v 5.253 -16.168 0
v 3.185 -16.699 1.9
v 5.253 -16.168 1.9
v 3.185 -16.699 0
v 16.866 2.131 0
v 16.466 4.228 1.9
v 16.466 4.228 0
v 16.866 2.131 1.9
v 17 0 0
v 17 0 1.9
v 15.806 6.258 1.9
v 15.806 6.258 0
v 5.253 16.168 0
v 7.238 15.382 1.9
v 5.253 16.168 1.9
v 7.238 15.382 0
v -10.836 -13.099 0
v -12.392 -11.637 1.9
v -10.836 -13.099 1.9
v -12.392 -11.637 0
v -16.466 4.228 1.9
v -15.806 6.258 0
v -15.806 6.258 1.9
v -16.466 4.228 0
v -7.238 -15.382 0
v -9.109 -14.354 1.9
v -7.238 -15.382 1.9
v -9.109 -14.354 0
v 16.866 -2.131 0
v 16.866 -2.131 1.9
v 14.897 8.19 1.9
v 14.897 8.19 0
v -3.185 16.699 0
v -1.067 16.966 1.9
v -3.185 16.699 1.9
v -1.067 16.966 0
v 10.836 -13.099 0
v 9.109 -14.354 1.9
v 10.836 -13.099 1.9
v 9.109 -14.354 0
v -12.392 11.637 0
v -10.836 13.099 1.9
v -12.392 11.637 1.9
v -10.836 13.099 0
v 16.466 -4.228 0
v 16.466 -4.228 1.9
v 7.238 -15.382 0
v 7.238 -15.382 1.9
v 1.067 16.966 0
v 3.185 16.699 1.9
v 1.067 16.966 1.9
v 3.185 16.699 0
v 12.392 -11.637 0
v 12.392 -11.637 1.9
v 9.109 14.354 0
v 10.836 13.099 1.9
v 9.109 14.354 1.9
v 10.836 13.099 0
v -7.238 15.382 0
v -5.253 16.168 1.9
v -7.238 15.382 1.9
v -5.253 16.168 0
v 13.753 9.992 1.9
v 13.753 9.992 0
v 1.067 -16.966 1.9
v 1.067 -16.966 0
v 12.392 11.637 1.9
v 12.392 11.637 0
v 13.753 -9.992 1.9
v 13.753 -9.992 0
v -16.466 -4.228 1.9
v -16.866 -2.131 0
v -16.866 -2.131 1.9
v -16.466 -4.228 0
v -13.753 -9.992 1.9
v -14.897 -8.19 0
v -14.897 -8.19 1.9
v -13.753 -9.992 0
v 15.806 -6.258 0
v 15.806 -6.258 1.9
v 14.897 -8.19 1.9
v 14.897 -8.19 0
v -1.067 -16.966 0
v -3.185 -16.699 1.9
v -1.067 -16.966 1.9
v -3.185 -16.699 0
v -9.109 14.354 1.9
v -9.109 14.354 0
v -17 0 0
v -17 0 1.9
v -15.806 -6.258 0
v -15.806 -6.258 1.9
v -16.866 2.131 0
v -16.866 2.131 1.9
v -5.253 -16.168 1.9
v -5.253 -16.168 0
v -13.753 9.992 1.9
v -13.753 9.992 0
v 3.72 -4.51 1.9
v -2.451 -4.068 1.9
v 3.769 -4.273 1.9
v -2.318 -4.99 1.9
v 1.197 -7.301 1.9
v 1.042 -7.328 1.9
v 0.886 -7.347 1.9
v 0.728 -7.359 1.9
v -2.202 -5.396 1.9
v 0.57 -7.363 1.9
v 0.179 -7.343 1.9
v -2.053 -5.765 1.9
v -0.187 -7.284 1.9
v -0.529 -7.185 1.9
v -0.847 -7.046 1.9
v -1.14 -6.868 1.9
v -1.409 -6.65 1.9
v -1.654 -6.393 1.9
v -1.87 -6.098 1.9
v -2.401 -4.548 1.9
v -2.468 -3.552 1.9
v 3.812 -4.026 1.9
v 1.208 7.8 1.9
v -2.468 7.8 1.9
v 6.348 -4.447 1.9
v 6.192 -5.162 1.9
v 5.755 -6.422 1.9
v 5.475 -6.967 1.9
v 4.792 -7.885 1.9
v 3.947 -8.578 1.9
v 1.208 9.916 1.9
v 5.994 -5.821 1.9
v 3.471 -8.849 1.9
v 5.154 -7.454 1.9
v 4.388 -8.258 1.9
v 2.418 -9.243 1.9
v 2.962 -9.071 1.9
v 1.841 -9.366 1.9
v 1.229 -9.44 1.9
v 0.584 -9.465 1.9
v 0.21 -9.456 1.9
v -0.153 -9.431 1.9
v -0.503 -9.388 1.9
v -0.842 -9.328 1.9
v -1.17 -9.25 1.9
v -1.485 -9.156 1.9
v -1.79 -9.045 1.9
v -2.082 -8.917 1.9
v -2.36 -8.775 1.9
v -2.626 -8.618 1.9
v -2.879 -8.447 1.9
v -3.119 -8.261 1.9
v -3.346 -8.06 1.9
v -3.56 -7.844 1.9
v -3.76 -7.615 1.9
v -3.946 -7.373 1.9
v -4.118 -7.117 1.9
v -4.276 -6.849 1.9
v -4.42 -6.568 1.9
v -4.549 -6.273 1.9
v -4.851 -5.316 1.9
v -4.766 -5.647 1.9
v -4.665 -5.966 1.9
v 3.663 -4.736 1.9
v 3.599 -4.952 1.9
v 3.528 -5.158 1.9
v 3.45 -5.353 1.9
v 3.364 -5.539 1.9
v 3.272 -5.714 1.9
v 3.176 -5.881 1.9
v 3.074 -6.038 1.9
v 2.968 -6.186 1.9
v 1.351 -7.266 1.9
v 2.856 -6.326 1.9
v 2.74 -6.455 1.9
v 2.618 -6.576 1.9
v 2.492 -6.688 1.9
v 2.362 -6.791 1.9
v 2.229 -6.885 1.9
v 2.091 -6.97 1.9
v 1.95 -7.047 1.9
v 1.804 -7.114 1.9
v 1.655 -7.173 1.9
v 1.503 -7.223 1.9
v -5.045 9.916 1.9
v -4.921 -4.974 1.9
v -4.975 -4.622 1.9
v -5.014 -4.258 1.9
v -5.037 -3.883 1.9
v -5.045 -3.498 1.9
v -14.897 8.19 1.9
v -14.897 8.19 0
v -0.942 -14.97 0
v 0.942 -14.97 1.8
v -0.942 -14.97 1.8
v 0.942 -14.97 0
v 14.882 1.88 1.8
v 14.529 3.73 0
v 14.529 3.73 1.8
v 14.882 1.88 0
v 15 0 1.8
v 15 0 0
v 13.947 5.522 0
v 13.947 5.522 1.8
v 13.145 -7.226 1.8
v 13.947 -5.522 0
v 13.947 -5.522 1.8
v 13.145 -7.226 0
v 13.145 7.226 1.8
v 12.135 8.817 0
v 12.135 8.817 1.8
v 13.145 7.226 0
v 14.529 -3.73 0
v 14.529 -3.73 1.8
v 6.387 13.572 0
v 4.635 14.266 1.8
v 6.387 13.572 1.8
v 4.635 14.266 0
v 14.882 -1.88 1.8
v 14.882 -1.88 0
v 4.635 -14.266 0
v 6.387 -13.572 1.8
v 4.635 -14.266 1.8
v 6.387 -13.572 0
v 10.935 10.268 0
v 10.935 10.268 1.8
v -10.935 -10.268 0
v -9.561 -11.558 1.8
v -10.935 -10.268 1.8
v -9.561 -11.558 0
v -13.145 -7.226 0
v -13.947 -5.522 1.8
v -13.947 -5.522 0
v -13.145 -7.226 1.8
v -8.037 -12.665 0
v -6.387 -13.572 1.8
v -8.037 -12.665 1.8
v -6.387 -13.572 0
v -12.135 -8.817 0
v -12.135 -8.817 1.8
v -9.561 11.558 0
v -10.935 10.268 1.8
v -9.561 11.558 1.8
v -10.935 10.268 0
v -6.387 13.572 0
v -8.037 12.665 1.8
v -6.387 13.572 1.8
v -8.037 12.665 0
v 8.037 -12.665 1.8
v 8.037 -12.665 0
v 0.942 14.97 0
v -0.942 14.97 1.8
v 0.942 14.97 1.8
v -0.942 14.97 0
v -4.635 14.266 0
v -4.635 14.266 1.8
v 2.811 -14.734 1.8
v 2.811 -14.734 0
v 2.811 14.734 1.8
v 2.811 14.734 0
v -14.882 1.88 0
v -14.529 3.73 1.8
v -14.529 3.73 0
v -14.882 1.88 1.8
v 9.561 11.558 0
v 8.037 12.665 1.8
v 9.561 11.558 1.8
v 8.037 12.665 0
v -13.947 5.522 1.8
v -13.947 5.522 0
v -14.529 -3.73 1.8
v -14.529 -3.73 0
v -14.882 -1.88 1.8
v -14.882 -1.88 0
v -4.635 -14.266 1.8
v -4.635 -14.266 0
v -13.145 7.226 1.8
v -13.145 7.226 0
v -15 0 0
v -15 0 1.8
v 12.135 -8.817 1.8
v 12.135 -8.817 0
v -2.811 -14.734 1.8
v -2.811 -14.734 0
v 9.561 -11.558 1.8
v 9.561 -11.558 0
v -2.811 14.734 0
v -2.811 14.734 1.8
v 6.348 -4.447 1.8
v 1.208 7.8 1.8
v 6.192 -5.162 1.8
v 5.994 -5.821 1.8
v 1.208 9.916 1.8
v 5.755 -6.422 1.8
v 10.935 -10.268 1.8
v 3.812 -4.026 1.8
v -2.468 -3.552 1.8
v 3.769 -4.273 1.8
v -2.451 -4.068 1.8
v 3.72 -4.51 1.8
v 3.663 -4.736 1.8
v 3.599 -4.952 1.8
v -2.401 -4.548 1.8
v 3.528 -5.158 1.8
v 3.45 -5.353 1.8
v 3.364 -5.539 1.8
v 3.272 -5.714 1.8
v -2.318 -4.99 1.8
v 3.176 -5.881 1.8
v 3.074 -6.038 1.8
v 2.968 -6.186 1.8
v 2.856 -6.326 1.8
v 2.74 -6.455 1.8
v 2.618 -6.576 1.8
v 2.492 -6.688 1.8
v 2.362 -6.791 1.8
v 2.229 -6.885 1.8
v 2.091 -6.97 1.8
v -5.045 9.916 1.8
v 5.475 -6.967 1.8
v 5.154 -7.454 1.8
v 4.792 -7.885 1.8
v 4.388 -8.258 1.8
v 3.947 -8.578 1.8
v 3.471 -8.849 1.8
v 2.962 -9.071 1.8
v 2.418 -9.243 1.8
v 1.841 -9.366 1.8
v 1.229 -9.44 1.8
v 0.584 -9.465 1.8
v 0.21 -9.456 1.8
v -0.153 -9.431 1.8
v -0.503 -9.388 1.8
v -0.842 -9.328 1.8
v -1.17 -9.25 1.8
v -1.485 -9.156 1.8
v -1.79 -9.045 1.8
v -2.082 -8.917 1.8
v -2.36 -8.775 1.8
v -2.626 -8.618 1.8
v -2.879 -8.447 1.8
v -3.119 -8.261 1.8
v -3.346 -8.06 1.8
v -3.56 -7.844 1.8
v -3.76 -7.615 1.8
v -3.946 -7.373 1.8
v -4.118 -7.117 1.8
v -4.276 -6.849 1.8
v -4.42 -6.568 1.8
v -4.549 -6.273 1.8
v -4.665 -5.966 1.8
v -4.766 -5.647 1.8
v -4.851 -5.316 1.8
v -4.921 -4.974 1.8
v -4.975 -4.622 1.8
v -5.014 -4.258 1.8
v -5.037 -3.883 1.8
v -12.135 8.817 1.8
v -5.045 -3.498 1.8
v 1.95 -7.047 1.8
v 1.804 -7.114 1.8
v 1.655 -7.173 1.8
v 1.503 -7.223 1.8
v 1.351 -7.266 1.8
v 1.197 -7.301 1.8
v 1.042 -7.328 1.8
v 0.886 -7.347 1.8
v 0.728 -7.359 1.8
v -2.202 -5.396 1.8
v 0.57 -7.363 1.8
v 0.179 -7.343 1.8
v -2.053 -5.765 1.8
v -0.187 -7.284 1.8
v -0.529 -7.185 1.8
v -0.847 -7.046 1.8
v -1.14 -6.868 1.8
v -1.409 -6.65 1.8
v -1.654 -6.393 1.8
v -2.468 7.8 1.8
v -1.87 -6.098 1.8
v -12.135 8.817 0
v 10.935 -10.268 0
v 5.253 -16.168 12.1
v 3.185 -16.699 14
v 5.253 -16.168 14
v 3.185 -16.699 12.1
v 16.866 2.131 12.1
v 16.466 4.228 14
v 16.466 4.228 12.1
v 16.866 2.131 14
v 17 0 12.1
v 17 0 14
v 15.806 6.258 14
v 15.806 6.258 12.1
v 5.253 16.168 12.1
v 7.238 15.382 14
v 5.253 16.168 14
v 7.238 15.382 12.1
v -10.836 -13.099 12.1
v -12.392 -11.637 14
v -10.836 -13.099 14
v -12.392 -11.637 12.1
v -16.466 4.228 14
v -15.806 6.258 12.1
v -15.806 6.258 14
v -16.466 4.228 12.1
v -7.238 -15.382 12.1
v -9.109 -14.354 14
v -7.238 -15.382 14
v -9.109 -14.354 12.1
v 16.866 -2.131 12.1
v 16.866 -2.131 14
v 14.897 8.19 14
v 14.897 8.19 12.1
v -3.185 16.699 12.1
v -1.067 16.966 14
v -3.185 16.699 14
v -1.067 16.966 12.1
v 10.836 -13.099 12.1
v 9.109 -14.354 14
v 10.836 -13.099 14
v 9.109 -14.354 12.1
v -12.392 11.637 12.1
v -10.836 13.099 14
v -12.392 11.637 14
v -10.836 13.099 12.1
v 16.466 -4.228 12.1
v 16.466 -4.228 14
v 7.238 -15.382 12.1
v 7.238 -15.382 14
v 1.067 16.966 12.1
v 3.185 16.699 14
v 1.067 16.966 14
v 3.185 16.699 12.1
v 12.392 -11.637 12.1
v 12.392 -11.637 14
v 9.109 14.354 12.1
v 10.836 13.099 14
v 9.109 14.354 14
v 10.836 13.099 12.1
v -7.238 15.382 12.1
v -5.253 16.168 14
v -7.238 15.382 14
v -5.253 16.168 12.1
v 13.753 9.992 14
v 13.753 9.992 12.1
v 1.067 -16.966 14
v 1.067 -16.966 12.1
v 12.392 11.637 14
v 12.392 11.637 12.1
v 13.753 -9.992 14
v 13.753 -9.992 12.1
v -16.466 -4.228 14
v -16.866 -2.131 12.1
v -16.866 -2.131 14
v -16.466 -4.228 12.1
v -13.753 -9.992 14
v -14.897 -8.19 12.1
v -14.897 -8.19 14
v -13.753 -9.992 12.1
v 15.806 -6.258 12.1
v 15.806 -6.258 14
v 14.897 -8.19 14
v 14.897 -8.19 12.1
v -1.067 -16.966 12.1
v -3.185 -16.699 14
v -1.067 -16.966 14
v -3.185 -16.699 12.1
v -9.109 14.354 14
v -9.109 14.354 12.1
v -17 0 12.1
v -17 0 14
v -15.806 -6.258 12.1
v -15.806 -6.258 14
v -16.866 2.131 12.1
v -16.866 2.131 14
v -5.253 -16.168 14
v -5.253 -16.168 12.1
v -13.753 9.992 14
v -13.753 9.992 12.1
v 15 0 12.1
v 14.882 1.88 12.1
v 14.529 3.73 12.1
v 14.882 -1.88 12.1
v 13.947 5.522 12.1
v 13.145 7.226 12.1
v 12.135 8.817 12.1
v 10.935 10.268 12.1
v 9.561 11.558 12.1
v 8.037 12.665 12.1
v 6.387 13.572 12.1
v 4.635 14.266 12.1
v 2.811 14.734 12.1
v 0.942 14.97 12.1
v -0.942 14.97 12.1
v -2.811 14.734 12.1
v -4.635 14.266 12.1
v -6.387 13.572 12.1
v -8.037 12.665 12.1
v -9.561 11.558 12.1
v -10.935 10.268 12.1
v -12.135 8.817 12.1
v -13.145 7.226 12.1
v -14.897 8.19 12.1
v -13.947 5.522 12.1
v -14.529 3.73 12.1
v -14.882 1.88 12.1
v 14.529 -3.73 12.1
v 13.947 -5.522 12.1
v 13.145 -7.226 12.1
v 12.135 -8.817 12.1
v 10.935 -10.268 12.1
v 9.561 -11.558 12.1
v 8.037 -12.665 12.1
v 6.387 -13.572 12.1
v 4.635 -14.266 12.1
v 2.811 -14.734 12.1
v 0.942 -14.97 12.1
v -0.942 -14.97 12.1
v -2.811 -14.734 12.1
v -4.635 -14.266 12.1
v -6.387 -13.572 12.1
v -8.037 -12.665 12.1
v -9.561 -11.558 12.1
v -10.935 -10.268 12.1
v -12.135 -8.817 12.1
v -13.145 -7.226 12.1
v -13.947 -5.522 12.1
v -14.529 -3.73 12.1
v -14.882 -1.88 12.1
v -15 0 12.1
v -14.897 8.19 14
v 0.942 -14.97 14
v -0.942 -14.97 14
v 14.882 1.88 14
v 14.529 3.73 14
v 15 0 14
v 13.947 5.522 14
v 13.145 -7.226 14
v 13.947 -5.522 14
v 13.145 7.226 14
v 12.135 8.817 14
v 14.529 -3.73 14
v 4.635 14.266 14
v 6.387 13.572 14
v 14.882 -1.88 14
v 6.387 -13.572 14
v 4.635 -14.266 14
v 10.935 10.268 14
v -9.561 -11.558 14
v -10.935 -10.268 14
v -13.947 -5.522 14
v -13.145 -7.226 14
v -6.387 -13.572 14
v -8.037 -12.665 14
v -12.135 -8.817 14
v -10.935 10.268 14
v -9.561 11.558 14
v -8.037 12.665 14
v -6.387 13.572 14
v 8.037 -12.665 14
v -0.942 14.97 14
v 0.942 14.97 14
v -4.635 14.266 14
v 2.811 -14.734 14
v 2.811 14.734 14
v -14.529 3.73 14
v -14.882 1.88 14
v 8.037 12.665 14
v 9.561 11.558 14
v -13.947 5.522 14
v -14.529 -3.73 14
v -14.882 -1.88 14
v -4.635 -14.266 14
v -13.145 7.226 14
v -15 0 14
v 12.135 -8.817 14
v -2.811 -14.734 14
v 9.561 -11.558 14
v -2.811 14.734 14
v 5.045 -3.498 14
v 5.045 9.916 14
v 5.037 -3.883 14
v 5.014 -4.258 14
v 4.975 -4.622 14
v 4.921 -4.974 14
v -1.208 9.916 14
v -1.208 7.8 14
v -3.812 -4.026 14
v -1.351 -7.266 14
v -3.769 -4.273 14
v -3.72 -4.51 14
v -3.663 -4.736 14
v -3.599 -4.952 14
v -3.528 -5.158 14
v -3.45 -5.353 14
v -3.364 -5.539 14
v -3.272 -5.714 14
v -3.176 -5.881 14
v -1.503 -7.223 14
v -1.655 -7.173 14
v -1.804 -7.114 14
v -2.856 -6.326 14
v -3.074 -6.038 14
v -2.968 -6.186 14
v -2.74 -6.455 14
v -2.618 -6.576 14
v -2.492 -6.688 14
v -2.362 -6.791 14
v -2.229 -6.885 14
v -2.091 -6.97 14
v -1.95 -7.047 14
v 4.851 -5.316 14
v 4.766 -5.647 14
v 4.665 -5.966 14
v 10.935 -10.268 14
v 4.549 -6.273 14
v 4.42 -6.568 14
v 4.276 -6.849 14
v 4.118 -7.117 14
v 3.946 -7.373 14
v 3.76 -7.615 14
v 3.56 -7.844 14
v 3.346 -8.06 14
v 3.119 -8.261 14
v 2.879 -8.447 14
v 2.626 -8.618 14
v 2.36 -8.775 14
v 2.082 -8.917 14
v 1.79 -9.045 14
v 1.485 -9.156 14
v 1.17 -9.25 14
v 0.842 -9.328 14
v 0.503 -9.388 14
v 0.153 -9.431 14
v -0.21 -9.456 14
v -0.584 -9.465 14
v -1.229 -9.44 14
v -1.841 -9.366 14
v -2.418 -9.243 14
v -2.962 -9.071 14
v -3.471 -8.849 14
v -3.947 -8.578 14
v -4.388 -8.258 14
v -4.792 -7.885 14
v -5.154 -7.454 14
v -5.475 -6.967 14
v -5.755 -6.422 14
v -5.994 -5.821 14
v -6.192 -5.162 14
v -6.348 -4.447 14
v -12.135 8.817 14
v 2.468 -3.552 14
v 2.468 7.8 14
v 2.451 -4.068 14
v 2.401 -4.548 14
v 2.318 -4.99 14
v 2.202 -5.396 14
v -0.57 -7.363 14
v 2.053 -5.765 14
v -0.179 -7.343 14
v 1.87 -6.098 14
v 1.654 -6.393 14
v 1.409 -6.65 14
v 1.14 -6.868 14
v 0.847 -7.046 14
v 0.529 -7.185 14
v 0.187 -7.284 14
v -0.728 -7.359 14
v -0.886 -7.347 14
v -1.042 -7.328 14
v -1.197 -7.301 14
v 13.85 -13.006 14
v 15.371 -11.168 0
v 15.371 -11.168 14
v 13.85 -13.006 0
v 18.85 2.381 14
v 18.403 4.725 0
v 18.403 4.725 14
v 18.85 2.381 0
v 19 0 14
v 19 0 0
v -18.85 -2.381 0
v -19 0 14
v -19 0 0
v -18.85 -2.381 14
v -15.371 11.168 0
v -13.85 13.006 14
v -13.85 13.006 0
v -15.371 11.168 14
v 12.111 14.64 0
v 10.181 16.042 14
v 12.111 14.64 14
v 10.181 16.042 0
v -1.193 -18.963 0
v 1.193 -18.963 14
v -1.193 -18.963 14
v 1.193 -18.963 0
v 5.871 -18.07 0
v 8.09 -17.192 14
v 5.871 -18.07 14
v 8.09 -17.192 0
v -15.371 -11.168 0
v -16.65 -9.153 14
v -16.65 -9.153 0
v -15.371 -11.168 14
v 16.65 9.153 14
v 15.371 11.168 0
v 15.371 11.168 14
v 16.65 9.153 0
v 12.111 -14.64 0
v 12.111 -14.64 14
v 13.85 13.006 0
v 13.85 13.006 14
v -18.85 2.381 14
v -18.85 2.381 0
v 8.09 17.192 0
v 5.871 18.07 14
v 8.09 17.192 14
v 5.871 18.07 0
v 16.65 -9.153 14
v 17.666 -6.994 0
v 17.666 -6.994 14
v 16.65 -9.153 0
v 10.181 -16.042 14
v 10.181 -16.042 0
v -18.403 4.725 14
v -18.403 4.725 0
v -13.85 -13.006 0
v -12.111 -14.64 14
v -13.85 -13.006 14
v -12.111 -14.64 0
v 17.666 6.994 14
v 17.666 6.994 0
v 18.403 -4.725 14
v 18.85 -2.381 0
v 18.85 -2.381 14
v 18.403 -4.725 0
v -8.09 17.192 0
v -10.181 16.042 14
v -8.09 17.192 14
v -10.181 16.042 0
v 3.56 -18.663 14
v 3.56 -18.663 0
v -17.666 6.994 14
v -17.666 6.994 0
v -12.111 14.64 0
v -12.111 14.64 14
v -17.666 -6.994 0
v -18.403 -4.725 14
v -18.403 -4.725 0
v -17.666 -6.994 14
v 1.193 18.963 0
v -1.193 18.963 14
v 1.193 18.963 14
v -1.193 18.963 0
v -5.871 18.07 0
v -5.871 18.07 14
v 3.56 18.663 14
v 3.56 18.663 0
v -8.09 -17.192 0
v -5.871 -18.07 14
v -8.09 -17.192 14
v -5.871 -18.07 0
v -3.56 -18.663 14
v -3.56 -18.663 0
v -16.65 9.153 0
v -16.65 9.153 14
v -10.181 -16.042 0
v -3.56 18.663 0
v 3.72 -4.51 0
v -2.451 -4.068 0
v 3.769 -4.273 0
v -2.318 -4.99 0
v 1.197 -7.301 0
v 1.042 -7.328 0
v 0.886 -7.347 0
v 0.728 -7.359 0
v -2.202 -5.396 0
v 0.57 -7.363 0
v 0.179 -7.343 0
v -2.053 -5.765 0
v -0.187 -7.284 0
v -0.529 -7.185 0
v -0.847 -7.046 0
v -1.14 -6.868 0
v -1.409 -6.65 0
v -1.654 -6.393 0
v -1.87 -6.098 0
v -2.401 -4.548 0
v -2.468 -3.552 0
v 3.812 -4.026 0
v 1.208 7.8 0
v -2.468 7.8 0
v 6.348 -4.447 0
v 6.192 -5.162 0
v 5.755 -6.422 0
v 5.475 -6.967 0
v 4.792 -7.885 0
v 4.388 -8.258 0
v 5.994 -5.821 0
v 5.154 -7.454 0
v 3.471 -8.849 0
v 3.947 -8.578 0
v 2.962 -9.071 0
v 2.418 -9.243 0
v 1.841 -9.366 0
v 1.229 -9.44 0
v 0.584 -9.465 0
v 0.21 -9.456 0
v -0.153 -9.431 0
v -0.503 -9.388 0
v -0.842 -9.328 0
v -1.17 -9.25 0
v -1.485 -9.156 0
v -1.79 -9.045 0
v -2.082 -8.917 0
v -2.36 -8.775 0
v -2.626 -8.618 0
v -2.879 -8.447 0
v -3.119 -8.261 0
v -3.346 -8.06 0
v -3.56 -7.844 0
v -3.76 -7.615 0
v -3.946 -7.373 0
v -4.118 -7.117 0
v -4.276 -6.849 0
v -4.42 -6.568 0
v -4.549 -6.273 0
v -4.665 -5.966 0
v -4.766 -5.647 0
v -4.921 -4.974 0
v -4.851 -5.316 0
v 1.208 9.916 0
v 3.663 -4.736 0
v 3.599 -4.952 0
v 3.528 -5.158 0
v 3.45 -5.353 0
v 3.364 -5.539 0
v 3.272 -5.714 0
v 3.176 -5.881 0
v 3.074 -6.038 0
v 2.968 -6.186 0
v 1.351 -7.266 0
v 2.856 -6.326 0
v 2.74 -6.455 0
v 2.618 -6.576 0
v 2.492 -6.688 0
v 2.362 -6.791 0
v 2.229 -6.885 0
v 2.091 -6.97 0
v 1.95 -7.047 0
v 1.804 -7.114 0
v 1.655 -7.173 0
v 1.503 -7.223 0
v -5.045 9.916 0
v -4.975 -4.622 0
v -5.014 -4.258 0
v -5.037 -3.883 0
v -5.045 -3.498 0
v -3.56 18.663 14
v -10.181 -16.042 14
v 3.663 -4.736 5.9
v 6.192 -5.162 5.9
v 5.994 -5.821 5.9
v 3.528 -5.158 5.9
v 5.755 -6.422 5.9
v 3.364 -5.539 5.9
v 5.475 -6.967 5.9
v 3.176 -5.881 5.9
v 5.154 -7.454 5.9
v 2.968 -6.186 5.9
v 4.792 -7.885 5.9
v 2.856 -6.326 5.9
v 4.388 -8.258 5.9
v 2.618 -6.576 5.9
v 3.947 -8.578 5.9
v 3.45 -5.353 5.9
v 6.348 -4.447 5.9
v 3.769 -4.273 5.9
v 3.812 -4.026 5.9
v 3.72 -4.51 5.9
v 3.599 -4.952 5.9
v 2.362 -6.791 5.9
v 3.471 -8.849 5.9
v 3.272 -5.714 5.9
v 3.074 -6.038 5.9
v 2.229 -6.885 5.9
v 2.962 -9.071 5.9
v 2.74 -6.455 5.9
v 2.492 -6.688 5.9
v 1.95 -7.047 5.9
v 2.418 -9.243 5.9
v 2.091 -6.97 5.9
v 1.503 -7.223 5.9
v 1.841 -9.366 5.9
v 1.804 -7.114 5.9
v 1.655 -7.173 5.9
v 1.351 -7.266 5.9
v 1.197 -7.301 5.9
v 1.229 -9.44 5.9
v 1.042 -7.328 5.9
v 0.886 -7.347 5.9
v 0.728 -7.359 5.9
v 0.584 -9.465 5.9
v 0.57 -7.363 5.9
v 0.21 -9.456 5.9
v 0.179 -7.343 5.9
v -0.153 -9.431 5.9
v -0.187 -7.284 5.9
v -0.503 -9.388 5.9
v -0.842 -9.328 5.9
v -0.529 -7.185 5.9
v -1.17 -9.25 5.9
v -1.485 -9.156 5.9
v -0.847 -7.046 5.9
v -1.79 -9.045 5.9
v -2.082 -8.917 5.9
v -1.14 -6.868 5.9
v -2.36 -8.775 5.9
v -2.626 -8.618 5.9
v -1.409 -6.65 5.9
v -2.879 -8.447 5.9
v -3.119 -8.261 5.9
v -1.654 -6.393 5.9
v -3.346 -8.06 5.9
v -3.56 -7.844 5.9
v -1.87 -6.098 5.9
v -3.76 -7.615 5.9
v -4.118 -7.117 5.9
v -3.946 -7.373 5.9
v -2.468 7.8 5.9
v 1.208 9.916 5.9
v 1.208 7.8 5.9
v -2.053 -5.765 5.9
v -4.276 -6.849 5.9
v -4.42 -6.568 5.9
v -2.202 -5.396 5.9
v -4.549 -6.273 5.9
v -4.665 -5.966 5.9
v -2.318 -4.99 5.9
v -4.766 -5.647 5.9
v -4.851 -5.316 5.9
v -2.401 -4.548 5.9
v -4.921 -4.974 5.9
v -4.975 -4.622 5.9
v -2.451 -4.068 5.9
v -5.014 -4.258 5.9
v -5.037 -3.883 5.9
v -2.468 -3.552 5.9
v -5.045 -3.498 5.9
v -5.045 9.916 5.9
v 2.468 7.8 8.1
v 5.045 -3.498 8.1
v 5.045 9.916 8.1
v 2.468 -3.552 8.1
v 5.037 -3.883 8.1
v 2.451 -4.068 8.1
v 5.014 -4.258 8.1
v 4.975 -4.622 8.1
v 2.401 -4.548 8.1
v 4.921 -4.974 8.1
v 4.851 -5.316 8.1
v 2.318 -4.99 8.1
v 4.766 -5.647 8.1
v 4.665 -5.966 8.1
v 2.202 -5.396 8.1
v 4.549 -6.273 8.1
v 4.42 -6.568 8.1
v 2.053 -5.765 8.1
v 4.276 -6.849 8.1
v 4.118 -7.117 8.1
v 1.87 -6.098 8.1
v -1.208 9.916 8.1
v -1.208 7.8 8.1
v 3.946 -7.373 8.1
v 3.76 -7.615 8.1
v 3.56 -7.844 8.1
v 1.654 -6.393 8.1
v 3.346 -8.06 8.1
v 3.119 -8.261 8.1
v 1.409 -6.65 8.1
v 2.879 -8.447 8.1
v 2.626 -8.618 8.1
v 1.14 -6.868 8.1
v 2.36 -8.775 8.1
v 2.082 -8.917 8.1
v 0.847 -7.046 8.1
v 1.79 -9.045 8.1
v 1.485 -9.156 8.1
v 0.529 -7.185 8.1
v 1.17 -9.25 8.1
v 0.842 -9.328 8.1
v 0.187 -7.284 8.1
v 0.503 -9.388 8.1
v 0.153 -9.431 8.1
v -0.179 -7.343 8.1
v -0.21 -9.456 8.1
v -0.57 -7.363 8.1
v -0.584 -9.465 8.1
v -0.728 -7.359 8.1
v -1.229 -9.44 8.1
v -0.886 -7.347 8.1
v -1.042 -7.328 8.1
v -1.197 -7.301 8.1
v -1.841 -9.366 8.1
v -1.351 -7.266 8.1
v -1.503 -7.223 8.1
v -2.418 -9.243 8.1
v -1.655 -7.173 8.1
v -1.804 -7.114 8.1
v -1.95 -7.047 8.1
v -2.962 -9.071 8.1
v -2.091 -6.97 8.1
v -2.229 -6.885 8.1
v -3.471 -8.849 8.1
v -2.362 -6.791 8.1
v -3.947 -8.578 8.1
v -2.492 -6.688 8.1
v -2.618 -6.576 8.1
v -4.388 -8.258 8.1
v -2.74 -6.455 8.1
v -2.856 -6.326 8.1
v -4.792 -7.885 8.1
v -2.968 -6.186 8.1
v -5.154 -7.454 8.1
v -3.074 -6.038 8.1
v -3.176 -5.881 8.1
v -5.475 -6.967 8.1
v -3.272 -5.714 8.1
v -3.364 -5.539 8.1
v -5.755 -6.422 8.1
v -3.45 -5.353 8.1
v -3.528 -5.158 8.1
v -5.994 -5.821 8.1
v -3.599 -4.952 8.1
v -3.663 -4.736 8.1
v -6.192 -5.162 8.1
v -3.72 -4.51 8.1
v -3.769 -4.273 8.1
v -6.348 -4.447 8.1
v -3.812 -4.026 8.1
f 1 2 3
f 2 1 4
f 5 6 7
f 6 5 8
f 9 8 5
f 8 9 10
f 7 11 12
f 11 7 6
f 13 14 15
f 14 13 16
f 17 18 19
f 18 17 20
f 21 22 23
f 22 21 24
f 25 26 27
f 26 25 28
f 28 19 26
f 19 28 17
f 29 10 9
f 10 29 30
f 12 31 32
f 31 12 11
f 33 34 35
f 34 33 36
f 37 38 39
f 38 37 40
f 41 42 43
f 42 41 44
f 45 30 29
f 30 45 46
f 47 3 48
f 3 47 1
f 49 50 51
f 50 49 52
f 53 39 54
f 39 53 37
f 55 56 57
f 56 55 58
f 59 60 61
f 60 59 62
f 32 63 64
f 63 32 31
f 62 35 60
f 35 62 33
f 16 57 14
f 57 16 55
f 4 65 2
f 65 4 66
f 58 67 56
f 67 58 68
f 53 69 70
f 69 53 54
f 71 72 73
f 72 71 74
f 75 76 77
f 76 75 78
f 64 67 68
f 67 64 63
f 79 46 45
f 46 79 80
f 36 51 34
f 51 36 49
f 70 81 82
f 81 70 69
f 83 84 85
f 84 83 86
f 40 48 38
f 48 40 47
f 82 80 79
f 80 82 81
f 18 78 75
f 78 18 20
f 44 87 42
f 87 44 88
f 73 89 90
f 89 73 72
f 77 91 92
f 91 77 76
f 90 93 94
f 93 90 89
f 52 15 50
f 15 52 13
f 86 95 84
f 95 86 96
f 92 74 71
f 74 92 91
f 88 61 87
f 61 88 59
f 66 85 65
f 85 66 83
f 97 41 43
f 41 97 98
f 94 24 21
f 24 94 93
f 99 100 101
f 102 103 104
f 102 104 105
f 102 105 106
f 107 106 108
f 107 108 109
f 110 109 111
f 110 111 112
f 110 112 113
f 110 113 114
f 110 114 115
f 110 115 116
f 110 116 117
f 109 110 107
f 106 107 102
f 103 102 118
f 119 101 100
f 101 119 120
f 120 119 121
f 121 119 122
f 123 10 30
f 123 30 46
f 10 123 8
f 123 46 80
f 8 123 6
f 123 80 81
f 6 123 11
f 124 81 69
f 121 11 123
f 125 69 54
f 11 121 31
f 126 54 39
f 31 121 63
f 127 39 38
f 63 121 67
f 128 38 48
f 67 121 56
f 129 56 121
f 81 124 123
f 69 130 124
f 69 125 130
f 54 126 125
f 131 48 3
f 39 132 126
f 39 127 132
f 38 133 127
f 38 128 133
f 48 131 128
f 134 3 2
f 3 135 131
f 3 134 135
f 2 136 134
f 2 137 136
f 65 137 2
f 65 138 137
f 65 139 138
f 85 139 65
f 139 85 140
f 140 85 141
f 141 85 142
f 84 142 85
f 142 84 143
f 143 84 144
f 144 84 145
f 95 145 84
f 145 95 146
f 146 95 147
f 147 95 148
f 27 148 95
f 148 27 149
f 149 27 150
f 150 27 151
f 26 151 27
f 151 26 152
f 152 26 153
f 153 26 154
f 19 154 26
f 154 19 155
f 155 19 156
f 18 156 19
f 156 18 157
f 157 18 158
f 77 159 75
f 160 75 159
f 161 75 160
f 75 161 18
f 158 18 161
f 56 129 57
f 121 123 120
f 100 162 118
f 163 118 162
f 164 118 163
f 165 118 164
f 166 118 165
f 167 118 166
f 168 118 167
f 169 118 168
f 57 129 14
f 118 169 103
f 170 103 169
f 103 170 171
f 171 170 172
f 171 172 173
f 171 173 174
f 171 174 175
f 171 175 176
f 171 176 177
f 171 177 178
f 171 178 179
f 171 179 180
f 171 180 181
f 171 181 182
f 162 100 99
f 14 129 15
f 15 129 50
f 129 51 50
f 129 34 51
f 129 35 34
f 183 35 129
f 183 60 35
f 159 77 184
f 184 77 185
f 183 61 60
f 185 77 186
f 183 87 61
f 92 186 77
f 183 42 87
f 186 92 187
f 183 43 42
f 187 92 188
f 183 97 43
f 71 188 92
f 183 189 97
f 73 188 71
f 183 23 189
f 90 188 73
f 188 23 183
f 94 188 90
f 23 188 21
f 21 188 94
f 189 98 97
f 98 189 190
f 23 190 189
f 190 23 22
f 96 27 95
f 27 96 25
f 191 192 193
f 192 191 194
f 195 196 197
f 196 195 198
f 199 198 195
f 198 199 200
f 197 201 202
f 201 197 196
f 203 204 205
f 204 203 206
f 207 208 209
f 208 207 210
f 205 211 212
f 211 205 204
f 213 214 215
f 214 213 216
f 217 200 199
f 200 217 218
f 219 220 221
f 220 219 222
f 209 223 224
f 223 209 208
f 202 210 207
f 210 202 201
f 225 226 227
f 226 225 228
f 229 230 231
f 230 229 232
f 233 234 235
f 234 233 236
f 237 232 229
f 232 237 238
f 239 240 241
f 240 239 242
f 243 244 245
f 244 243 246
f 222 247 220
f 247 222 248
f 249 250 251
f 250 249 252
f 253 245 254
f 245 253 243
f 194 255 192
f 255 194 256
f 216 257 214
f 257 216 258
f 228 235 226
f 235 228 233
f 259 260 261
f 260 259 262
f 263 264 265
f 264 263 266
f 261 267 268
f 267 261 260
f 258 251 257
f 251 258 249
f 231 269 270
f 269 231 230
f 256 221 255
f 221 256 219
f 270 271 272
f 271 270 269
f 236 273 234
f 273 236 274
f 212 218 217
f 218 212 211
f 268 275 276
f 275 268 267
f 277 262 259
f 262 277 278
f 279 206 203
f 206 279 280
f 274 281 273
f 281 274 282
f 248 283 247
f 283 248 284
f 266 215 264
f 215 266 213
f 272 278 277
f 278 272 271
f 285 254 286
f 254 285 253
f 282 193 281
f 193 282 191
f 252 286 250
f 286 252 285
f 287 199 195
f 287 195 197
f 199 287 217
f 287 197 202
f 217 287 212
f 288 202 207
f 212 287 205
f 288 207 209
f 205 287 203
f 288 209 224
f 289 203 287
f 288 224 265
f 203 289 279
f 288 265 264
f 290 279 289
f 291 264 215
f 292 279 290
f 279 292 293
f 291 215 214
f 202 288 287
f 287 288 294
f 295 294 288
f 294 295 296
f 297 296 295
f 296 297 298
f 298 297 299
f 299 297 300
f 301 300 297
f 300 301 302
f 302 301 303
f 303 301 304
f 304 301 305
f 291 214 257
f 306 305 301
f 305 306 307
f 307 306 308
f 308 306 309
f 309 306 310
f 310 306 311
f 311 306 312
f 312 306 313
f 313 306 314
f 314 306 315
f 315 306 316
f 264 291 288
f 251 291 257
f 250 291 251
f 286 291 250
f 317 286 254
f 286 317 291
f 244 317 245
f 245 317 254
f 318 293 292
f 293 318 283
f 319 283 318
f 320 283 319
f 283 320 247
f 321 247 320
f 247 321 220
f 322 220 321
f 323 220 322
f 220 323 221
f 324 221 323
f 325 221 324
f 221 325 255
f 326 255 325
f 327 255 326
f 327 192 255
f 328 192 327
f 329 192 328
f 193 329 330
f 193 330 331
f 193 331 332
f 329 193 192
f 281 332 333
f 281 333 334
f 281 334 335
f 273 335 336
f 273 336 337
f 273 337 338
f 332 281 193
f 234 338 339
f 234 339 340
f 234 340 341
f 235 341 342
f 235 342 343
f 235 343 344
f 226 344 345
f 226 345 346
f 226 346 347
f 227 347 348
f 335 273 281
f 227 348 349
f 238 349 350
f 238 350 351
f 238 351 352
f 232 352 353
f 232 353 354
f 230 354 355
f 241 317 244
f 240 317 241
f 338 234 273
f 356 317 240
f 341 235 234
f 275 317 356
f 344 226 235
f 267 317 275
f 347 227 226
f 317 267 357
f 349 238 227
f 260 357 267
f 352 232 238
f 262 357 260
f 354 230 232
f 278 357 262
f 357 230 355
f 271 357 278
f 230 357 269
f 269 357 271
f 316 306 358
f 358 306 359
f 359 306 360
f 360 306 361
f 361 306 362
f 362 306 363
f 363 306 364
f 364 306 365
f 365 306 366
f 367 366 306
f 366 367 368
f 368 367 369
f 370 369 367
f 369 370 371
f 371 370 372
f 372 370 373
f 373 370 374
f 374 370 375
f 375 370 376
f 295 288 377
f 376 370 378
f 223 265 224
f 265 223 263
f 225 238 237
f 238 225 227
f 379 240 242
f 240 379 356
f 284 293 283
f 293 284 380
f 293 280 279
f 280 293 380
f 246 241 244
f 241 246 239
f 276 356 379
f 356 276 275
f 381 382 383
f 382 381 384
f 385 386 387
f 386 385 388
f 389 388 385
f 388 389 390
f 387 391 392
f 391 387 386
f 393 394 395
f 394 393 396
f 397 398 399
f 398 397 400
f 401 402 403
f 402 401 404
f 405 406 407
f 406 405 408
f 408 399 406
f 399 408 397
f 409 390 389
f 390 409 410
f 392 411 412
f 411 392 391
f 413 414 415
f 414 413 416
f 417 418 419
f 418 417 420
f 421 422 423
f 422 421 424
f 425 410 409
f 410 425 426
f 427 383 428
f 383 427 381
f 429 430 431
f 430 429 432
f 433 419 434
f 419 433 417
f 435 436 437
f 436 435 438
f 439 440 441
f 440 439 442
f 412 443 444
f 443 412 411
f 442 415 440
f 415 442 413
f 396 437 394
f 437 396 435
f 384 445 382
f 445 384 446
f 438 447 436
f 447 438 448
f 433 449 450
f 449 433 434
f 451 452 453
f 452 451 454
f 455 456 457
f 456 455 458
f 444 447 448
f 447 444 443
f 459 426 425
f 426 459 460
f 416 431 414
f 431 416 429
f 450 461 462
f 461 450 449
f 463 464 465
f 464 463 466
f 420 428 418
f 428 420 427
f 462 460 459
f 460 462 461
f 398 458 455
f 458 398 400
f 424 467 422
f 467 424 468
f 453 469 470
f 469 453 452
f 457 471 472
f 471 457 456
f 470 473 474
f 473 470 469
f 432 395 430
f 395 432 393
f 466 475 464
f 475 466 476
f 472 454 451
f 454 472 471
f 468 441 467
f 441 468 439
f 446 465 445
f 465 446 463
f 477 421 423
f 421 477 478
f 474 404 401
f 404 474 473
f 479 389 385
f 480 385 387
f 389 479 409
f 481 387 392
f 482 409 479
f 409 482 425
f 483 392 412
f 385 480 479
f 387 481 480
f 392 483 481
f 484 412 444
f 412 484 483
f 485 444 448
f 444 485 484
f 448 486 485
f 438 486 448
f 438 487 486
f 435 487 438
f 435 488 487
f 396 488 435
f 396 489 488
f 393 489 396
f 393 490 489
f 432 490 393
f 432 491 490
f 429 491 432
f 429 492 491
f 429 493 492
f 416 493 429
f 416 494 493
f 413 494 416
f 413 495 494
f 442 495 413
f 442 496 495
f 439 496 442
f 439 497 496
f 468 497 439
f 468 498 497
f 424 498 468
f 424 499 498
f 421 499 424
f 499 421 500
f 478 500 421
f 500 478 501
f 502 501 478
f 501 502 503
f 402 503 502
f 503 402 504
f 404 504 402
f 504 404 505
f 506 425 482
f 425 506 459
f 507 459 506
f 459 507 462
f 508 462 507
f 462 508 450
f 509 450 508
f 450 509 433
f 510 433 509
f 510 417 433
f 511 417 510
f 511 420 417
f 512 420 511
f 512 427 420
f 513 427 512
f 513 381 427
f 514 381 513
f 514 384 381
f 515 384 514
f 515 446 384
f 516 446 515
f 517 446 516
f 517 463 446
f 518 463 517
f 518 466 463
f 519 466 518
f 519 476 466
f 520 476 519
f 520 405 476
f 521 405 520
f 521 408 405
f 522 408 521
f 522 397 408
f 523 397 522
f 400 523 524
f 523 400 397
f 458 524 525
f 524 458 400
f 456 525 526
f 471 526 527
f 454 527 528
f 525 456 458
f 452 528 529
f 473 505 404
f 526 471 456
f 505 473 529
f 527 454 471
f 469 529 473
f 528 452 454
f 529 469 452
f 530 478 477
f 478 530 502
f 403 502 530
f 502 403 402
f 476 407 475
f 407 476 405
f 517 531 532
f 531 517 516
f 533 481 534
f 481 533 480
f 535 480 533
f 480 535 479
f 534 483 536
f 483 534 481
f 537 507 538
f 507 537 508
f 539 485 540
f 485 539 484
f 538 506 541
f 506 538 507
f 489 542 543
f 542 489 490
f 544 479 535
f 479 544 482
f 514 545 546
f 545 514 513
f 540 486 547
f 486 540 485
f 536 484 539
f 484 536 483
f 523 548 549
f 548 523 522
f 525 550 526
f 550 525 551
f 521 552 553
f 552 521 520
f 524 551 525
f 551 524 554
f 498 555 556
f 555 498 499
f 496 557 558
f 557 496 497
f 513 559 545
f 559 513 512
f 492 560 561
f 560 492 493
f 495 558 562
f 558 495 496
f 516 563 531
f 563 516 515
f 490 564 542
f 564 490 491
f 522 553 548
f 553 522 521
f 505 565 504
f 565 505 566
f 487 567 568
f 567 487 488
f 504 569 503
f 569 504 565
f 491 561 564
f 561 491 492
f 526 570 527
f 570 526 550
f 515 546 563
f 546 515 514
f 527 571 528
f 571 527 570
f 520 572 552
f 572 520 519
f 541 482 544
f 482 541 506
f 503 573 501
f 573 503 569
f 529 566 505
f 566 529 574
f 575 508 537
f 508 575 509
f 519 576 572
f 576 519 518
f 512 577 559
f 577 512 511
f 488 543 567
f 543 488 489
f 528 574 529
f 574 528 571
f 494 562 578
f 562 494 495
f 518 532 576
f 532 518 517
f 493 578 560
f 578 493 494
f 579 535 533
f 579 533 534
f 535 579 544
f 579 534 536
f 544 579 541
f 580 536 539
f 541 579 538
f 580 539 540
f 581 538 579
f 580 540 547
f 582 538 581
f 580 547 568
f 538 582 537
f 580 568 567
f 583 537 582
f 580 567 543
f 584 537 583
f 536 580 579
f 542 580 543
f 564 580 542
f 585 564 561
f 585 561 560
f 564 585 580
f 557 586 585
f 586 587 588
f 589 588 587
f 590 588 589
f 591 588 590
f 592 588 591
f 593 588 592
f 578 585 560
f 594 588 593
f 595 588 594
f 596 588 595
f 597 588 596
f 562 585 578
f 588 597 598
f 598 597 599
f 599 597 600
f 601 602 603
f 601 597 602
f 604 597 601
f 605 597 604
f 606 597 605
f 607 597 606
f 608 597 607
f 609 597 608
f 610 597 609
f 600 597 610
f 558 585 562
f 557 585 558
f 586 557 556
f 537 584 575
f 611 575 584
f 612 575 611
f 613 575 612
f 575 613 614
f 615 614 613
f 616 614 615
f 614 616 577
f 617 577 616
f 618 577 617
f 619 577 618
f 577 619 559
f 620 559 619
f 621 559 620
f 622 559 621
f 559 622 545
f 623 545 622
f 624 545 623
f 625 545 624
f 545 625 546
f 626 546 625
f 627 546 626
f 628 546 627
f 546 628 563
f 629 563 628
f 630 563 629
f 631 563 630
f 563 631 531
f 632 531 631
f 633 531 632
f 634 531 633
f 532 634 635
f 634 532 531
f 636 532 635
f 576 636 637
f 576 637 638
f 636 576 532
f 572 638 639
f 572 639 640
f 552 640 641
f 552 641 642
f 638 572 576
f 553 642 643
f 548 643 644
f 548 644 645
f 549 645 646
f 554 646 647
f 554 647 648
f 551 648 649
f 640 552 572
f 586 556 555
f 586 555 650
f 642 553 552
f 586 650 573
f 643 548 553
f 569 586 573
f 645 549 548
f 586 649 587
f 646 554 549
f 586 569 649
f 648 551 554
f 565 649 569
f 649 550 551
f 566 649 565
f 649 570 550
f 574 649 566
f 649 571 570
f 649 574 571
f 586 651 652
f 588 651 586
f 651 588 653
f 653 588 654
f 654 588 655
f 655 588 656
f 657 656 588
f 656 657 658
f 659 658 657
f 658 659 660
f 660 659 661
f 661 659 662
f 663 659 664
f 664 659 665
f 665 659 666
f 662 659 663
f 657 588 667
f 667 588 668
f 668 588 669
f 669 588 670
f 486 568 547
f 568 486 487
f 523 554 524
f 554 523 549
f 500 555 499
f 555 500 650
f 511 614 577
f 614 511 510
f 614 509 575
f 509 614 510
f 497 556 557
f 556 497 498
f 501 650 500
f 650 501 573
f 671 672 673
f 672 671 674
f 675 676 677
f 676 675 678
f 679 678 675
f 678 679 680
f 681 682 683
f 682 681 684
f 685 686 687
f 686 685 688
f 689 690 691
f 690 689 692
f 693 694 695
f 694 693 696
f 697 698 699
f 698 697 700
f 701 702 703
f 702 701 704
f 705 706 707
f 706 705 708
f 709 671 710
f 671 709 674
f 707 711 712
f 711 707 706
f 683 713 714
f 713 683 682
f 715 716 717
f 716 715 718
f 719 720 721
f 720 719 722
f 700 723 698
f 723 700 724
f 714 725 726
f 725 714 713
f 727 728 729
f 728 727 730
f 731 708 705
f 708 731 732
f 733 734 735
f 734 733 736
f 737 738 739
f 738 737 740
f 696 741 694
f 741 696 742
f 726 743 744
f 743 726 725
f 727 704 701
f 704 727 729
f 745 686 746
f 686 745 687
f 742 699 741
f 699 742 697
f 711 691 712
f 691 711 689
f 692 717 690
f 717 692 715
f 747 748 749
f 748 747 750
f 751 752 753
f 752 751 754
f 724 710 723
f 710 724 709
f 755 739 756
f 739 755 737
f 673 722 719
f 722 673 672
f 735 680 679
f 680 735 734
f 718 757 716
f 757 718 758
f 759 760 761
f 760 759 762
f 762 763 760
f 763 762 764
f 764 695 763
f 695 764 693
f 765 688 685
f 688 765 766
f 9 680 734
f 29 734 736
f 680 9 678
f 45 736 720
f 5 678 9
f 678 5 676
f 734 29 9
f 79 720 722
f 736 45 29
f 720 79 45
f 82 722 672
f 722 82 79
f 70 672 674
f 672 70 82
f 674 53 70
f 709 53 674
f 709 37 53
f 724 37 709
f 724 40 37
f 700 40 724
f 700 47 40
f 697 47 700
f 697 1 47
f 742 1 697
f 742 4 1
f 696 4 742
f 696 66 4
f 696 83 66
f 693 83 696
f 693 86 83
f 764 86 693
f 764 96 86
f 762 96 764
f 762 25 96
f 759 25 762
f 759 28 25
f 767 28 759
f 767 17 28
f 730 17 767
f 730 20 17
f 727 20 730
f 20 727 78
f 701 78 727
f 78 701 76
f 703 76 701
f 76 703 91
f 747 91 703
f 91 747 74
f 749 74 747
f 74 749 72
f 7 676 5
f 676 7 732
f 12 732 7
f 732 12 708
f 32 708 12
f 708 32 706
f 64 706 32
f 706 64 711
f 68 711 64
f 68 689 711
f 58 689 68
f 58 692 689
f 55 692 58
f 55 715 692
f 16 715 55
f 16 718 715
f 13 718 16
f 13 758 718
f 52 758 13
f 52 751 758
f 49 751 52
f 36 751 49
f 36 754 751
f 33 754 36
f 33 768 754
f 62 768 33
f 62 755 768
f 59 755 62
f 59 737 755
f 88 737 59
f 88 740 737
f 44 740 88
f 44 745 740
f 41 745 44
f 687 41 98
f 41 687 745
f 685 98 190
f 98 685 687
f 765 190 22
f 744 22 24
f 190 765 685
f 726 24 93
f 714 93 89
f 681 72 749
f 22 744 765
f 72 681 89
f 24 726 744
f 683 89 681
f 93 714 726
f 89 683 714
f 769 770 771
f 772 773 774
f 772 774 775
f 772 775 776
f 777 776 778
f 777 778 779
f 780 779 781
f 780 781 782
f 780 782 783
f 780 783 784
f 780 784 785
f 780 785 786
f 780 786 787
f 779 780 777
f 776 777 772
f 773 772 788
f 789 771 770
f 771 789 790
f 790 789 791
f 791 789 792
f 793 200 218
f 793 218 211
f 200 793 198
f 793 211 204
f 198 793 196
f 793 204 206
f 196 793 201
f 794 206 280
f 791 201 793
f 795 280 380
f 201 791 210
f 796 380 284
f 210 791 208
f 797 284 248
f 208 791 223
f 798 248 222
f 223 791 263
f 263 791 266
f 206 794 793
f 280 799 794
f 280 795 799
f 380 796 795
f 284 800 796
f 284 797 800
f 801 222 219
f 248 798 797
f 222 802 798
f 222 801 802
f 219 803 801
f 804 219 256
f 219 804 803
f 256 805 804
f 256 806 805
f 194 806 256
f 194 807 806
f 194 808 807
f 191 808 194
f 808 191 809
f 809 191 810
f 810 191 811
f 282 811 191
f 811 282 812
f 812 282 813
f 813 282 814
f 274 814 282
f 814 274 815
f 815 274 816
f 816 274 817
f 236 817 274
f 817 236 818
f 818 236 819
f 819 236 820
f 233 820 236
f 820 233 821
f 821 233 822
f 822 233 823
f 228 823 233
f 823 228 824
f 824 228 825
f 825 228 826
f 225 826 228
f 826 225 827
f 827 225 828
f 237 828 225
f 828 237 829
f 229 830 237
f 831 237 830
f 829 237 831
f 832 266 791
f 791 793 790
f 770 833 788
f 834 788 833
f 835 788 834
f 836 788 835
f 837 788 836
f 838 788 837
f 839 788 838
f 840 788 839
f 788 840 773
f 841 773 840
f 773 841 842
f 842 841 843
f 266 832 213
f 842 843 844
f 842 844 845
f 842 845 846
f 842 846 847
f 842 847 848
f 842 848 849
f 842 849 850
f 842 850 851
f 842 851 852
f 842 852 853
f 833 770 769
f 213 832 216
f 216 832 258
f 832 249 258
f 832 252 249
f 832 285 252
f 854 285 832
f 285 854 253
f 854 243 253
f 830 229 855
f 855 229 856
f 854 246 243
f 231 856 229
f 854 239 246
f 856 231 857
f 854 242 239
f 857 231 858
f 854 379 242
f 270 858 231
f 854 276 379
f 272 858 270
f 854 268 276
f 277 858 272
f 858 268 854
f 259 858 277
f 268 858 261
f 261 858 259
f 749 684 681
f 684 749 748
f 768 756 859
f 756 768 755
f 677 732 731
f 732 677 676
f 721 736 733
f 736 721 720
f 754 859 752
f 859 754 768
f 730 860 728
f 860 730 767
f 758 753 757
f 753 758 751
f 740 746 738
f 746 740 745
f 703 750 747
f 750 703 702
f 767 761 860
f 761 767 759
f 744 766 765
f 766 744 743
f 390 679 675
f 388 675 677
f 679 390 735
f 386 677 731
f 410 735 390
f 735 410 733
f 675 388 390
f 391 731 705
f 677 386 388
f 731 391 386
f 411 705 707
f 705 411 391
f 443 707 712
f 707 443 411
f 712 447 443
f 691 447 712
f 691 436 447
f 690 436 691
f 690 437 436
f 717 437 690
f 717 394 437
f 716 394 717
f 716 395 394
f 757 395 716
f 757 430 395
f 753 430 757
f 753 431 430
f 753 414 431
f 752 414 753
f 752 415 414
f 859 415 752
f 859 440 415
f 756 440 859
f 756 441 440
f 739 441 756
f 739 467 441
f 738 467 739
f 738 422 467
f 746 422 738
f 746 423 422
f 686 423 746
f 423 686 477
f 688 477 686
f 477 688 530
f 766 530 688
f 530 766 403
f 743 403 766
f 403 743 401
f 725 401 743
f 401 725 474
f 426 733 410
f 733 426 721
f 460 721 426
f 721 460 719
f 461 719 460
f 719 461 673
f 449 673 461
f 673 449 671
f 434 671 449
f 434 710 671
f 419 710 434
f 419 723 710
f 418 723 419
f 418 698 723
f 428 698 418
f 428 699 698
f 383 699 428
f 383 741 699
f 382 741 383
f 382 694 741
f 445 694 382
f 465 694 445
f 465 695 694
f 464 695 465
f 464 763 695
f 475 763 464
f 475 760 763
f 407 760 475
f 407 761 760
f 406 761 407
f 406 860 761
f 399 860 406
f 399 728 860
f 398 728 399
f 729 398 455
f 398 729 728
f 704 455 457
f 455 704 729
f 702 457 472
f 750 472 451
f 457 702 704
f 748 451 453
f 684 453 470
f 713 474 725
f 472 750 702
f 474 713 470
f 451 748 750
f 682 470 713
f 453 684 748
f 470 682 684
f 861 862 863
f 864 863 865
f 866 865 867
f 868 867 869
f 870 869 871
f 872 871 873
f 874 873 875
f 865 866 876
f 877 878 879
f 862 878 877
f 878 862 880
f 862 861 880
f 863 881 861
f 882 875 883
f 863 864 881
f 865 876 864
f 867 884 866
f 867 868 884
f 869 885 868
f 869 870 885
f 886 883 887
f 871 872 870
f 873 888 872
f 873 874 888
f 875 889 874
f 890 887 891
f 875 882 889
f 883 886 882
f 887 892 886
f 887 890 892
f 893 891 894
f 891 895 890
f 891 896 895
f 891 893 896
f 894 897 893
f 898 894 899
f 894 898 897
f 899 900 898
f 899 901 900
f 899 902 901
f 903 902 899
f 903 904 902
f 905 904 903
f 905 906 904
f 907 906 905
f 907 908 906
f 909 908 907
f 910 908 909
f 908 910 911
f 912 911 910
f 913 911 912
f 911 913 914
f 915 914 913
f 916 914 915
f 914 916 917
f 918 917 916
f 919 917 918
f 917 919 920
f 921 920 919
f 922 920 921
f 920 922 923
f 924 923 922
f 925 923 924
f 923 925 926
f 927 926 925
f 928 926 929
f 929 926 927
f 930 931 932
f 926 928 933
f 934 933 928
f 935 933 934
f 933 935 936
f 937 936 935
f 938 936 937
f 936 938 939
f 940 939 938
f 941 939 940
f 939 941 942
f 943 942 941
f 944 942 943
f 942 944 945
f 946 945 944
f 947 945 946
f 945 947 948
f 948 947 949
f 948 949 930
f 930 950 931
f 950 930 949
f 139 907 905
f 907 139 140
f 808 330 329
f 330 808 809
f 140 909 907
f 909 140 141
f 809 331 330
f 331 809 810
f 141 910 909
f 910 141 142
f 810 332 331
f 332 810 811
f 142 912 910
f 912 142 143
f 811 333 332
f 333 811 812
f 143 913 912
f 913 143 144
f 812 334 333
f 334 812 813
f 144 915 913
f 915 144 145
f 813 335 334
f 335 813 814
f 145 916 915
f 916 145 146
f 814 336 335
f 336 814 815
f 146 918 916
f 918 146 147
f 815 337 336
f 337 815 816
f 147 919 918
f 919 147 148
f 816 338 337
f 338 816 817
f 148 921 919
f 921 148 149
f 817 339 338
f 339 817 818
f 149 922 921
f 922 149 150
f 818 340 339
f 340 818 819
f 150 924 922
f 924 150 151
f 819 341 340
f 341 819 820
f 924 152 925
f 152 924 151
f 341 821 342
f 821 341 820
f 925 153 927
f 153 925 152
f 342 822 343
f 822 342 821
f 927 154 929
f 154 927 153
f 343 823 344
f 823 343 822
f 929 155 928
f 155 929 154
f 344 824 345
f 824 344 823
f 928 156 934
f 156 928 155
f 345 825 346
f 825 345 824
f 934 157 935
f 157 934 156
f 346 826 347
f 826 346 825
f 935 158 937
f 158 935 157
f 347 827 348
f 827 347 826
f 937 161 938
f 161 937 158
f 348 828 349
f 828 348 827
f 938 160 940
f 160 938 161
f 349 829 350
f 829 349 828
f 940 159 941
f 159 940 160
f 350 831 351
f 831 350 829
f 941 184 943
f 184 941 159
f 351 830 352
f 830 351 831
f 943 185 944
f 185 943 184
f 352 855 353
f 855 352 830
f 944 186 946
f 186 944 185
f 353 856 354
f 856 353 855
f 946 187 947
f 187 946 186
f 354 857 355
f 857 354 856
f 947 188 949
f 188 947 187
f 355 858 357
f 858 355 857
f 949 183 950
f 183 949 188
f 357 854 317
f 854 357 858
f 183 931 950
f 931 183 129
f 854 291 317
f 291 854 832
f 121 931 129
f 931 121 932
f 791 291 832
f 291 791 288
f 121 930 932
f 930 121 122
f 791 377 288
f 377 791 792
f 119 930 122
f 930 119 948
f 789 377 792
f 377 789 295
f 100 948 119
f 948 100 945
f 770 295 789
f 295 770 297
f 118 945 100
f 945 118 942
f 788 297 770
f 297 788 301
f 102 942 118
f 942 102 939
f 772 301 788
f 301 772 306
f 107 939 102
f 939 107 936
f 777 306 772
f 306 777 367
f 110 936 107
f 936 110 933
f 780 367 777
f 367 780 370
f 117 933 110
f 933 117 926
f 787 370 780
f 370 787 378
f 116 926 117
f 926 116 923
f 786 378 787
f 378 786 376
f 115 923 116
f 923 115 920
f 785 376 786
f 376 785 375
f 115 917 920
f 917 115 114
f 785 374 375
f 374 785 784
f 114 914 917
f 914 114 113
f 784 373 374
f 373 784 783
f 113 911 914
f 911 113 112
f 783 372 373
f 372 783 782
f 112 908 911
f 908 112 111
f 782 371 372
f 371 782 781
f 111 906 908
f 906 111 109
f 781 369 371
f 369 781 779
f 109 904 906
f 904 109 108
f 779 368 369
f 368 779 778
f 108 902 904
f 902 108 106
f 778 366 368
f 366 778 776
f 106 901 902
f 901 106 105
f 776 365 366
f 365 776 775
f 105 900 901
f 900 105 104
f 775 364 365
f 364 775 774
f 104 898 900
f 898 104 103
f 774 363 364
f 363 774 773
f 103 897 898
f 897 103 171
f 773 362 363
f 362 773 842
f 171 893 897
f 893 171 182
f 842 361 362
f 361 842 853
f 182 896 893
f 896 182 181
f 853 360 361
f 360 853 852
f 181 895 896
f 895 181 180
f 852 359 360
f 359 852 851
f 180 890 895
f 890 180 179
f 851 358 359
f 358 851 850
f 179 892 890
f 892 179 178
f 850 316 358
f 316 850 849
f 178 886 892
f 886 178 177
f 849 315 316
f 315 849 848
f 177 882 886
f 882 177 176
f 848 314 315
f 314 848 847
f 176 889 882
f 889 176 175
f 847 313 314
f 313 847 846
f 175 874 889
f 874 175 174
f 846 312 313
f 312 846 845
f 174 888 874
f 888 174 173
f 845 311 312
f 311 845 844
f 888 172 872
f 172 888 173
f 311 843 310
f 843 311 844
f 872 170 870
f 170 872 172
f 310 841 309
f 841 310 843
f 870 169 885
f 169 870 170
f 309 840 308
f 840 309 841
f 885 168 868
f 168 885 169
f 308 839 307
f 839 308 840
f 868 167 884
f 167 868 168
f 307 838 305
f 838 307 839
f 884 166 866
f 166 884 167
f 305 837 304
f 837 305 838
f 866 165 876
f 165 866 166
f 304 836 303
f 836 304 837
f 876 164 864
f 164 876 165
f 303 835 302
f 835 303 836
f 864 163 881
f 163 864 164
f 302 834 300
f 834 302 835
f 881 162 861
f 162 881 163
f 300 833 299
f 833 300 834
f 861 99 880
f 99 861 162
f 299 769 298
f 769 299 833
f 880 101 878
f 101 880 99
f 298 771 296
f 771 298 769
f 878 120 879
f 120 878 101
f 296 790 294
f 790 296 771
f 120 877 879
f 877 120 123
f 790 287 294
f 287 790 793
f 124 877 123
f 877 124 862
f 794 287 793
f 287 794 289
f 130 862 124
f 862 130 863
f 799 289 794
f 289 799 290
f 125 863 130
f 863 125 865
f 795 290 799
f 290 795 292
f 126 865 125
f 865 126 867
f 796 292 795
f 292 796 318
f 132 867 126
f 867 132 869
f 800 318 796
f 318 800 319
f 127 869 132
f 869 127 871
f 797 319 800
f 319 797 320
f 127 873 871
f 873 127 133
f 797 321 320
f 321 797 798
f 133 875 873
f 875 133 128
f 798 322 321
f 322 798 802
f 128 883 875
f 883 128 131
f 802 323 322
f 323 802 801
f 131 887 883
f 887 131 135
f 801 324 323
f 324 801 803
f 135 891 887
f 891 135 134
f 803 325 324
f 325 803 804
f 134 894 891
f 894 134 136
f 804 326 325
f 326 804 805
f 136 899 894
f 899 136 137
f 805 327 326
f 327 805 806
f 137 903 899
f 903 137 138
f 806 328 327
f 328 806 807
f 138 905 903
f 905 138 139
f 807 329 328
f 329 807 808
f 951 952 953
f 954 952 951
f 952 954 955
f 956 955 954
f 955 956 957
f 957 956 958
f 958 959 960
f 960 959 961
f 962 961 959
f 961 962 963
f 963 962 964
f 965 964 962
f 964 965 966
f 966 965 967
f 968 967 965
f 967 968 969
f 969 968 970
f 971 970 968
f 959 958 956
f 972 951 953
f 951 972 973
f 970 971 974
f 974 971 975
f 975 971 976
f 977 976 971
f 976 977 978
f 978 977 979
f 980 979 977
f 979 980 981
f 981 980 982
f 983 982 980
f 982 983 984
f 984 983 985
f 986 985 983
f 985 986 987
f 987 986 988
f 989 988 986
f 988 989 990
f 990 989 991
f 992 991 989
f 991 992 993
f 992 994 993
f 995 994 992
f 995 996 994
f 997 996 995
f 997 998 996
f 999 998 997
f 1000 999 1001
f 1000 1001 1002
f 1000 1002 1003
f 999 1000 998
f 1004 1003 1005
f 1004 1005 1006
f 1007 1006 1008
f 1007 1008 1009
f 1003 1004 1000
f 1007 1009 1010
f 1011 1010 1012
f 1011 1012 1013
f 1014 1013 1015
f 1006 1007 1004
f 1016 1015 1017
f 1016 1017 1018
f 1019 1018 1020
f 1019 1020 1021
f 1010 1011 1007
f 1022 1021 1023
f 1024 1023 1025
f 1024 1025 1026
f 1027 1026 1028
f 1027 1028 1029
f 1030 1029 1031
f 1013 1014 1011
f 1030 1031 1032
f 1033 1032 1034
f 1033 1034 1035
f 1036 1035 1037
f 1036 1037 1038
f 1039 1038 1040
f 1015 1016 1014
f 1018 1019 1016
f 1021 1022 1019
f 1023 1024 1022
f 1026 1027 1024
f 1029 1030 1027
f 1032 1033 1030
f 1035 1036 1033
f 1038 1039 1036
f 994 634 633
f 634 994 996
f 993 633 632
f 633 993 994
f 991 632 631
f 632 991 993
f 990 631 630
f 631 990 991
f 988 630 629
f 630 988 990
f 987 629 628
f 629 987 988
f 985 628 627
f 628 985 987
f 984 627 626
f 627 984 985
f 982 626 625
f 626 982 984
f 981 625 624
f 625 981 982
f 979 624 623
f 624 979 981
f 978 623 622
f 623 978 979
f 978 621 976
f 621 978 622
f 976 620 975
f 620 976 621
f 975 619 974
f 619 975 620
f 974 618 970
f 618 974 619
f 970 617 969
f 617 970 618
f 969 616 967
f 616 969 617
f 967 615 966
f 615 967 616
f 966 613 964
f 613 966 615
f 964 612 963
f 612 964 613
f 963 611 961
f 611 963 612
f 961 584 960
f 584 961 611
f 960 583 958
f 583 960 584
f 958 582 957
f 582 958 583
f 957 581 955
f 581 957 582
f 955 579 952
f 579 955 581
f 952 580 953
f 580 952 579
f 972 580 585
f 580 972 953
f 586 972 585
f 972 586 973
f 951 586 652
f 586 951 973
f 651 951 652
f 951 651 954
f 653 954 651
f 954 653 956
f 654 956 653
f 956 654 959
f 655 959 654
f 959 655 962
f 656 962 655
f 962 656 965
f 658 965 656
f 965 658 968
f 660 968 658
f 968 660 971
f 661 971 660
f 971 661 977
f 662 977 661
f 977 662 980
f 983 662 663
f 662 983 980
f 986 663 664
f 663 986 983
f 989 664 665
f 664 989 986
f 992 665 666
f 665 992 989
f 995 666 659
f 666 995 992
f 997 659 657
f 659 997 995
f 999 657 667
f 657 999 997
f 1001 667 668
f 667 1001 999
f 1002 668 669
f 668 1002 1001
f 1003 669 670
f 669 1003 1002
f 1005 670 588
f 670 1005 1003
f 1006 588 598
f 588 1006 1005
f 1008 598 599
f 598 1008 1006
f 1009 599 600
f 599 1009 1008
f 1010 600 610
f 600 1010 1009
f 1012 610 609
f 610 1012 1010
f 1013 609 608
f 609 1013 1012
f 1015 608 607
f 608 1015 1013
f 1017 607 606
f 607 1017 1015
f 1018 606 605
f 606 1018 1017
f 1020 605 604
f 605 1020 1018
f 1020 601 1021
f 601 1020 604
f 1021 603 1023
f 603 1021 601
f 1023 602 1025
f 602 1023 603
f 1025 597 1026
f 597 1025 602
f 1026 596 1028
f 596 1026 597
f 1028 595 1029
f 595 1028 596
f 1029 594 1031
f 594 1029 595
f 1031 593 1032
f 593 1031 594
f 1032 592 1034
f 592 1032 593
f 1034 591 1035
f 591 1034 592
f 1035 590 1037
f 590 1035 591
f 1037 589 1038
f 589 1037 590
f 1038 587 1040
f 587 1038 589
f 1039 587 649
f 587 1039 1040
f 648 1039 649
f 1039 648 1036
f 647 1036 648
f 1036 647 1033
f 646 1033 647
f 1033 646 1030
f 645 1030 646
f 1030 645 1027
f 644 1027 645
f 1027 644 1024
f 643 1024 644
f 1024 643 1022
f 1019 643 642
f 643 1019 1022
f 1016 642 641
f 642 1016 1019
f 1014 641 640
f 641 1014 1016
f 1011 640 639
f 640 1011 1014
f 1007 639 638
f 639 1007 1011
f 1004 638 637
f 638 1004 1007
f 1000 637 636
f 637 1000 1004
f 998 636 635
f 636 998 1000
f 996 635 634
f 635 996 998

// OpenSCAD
//The letter to cut out in the middle of the coin
Letter="J";

//Font size, so that one letter fits on the coin
Fontsize=20;

//Font name
fontname="Arial"; 

//Diameter of the coin
dia=38;

//height of the coin
height=14;

//outer rim thickness of the coin
rand=2;

//connecting plastic in the middle of the coin
connectorthickness=2;

//accuracy of the coin
$fn=50;

/* [Hidden] */
//-------------------

sink_letter=height/2-connectorthickness/2;

/*
Customizable cash register coin

Version 3, January 2018
Written by MC Geisler (mcgenki at gmail dot com)

License: Attribution-NonCommercial-ShareAlike 4.0 International (CC BY-NC-SA 4.0)
You are free to:
    Share - copy and redistribute the material in any medium or format
    Adapt - remix, transform, and build upon the material
Under the following terms:
    Attribution - You must give appropriate credit, provide a link to the license, and indicate if changes were made. 
    You may do so in any reasonable manner, but not in any way that suggests the licensor endorses you or your use.
    NonCommercial - You may not use the material for commercial purposes.
    ShareAlike - If you remix, transform, or build upon the material, you must distribute your contributions under the same license as the original. 
*/

module ring()
{
    difference()
    {
        cylinder(d=dia-2*rand, h=rand);
        translate([0,0,-.1])
            cylinder(d=dia-4*rand, h=rand);
    }
}

module Writeletter()
{    
    linear_extrude(height=sink_letter,convexity = 10)
        text(Letter,size=Fontsize,font=fontname,halign="center",valign="center");    
}

difference()
{
    cylinder(d=dia, h=height);
    
    translate([0,0,-.1])
        ring();
    
    translate([0,0,height-rand+.1])
        ring();
    
    translate([0,0,-.1])
        scale([-1,1,1])
            Writeletter();
    
    translate([0,0,height-sink_letter+.1])
        Writeletter();
        
}
